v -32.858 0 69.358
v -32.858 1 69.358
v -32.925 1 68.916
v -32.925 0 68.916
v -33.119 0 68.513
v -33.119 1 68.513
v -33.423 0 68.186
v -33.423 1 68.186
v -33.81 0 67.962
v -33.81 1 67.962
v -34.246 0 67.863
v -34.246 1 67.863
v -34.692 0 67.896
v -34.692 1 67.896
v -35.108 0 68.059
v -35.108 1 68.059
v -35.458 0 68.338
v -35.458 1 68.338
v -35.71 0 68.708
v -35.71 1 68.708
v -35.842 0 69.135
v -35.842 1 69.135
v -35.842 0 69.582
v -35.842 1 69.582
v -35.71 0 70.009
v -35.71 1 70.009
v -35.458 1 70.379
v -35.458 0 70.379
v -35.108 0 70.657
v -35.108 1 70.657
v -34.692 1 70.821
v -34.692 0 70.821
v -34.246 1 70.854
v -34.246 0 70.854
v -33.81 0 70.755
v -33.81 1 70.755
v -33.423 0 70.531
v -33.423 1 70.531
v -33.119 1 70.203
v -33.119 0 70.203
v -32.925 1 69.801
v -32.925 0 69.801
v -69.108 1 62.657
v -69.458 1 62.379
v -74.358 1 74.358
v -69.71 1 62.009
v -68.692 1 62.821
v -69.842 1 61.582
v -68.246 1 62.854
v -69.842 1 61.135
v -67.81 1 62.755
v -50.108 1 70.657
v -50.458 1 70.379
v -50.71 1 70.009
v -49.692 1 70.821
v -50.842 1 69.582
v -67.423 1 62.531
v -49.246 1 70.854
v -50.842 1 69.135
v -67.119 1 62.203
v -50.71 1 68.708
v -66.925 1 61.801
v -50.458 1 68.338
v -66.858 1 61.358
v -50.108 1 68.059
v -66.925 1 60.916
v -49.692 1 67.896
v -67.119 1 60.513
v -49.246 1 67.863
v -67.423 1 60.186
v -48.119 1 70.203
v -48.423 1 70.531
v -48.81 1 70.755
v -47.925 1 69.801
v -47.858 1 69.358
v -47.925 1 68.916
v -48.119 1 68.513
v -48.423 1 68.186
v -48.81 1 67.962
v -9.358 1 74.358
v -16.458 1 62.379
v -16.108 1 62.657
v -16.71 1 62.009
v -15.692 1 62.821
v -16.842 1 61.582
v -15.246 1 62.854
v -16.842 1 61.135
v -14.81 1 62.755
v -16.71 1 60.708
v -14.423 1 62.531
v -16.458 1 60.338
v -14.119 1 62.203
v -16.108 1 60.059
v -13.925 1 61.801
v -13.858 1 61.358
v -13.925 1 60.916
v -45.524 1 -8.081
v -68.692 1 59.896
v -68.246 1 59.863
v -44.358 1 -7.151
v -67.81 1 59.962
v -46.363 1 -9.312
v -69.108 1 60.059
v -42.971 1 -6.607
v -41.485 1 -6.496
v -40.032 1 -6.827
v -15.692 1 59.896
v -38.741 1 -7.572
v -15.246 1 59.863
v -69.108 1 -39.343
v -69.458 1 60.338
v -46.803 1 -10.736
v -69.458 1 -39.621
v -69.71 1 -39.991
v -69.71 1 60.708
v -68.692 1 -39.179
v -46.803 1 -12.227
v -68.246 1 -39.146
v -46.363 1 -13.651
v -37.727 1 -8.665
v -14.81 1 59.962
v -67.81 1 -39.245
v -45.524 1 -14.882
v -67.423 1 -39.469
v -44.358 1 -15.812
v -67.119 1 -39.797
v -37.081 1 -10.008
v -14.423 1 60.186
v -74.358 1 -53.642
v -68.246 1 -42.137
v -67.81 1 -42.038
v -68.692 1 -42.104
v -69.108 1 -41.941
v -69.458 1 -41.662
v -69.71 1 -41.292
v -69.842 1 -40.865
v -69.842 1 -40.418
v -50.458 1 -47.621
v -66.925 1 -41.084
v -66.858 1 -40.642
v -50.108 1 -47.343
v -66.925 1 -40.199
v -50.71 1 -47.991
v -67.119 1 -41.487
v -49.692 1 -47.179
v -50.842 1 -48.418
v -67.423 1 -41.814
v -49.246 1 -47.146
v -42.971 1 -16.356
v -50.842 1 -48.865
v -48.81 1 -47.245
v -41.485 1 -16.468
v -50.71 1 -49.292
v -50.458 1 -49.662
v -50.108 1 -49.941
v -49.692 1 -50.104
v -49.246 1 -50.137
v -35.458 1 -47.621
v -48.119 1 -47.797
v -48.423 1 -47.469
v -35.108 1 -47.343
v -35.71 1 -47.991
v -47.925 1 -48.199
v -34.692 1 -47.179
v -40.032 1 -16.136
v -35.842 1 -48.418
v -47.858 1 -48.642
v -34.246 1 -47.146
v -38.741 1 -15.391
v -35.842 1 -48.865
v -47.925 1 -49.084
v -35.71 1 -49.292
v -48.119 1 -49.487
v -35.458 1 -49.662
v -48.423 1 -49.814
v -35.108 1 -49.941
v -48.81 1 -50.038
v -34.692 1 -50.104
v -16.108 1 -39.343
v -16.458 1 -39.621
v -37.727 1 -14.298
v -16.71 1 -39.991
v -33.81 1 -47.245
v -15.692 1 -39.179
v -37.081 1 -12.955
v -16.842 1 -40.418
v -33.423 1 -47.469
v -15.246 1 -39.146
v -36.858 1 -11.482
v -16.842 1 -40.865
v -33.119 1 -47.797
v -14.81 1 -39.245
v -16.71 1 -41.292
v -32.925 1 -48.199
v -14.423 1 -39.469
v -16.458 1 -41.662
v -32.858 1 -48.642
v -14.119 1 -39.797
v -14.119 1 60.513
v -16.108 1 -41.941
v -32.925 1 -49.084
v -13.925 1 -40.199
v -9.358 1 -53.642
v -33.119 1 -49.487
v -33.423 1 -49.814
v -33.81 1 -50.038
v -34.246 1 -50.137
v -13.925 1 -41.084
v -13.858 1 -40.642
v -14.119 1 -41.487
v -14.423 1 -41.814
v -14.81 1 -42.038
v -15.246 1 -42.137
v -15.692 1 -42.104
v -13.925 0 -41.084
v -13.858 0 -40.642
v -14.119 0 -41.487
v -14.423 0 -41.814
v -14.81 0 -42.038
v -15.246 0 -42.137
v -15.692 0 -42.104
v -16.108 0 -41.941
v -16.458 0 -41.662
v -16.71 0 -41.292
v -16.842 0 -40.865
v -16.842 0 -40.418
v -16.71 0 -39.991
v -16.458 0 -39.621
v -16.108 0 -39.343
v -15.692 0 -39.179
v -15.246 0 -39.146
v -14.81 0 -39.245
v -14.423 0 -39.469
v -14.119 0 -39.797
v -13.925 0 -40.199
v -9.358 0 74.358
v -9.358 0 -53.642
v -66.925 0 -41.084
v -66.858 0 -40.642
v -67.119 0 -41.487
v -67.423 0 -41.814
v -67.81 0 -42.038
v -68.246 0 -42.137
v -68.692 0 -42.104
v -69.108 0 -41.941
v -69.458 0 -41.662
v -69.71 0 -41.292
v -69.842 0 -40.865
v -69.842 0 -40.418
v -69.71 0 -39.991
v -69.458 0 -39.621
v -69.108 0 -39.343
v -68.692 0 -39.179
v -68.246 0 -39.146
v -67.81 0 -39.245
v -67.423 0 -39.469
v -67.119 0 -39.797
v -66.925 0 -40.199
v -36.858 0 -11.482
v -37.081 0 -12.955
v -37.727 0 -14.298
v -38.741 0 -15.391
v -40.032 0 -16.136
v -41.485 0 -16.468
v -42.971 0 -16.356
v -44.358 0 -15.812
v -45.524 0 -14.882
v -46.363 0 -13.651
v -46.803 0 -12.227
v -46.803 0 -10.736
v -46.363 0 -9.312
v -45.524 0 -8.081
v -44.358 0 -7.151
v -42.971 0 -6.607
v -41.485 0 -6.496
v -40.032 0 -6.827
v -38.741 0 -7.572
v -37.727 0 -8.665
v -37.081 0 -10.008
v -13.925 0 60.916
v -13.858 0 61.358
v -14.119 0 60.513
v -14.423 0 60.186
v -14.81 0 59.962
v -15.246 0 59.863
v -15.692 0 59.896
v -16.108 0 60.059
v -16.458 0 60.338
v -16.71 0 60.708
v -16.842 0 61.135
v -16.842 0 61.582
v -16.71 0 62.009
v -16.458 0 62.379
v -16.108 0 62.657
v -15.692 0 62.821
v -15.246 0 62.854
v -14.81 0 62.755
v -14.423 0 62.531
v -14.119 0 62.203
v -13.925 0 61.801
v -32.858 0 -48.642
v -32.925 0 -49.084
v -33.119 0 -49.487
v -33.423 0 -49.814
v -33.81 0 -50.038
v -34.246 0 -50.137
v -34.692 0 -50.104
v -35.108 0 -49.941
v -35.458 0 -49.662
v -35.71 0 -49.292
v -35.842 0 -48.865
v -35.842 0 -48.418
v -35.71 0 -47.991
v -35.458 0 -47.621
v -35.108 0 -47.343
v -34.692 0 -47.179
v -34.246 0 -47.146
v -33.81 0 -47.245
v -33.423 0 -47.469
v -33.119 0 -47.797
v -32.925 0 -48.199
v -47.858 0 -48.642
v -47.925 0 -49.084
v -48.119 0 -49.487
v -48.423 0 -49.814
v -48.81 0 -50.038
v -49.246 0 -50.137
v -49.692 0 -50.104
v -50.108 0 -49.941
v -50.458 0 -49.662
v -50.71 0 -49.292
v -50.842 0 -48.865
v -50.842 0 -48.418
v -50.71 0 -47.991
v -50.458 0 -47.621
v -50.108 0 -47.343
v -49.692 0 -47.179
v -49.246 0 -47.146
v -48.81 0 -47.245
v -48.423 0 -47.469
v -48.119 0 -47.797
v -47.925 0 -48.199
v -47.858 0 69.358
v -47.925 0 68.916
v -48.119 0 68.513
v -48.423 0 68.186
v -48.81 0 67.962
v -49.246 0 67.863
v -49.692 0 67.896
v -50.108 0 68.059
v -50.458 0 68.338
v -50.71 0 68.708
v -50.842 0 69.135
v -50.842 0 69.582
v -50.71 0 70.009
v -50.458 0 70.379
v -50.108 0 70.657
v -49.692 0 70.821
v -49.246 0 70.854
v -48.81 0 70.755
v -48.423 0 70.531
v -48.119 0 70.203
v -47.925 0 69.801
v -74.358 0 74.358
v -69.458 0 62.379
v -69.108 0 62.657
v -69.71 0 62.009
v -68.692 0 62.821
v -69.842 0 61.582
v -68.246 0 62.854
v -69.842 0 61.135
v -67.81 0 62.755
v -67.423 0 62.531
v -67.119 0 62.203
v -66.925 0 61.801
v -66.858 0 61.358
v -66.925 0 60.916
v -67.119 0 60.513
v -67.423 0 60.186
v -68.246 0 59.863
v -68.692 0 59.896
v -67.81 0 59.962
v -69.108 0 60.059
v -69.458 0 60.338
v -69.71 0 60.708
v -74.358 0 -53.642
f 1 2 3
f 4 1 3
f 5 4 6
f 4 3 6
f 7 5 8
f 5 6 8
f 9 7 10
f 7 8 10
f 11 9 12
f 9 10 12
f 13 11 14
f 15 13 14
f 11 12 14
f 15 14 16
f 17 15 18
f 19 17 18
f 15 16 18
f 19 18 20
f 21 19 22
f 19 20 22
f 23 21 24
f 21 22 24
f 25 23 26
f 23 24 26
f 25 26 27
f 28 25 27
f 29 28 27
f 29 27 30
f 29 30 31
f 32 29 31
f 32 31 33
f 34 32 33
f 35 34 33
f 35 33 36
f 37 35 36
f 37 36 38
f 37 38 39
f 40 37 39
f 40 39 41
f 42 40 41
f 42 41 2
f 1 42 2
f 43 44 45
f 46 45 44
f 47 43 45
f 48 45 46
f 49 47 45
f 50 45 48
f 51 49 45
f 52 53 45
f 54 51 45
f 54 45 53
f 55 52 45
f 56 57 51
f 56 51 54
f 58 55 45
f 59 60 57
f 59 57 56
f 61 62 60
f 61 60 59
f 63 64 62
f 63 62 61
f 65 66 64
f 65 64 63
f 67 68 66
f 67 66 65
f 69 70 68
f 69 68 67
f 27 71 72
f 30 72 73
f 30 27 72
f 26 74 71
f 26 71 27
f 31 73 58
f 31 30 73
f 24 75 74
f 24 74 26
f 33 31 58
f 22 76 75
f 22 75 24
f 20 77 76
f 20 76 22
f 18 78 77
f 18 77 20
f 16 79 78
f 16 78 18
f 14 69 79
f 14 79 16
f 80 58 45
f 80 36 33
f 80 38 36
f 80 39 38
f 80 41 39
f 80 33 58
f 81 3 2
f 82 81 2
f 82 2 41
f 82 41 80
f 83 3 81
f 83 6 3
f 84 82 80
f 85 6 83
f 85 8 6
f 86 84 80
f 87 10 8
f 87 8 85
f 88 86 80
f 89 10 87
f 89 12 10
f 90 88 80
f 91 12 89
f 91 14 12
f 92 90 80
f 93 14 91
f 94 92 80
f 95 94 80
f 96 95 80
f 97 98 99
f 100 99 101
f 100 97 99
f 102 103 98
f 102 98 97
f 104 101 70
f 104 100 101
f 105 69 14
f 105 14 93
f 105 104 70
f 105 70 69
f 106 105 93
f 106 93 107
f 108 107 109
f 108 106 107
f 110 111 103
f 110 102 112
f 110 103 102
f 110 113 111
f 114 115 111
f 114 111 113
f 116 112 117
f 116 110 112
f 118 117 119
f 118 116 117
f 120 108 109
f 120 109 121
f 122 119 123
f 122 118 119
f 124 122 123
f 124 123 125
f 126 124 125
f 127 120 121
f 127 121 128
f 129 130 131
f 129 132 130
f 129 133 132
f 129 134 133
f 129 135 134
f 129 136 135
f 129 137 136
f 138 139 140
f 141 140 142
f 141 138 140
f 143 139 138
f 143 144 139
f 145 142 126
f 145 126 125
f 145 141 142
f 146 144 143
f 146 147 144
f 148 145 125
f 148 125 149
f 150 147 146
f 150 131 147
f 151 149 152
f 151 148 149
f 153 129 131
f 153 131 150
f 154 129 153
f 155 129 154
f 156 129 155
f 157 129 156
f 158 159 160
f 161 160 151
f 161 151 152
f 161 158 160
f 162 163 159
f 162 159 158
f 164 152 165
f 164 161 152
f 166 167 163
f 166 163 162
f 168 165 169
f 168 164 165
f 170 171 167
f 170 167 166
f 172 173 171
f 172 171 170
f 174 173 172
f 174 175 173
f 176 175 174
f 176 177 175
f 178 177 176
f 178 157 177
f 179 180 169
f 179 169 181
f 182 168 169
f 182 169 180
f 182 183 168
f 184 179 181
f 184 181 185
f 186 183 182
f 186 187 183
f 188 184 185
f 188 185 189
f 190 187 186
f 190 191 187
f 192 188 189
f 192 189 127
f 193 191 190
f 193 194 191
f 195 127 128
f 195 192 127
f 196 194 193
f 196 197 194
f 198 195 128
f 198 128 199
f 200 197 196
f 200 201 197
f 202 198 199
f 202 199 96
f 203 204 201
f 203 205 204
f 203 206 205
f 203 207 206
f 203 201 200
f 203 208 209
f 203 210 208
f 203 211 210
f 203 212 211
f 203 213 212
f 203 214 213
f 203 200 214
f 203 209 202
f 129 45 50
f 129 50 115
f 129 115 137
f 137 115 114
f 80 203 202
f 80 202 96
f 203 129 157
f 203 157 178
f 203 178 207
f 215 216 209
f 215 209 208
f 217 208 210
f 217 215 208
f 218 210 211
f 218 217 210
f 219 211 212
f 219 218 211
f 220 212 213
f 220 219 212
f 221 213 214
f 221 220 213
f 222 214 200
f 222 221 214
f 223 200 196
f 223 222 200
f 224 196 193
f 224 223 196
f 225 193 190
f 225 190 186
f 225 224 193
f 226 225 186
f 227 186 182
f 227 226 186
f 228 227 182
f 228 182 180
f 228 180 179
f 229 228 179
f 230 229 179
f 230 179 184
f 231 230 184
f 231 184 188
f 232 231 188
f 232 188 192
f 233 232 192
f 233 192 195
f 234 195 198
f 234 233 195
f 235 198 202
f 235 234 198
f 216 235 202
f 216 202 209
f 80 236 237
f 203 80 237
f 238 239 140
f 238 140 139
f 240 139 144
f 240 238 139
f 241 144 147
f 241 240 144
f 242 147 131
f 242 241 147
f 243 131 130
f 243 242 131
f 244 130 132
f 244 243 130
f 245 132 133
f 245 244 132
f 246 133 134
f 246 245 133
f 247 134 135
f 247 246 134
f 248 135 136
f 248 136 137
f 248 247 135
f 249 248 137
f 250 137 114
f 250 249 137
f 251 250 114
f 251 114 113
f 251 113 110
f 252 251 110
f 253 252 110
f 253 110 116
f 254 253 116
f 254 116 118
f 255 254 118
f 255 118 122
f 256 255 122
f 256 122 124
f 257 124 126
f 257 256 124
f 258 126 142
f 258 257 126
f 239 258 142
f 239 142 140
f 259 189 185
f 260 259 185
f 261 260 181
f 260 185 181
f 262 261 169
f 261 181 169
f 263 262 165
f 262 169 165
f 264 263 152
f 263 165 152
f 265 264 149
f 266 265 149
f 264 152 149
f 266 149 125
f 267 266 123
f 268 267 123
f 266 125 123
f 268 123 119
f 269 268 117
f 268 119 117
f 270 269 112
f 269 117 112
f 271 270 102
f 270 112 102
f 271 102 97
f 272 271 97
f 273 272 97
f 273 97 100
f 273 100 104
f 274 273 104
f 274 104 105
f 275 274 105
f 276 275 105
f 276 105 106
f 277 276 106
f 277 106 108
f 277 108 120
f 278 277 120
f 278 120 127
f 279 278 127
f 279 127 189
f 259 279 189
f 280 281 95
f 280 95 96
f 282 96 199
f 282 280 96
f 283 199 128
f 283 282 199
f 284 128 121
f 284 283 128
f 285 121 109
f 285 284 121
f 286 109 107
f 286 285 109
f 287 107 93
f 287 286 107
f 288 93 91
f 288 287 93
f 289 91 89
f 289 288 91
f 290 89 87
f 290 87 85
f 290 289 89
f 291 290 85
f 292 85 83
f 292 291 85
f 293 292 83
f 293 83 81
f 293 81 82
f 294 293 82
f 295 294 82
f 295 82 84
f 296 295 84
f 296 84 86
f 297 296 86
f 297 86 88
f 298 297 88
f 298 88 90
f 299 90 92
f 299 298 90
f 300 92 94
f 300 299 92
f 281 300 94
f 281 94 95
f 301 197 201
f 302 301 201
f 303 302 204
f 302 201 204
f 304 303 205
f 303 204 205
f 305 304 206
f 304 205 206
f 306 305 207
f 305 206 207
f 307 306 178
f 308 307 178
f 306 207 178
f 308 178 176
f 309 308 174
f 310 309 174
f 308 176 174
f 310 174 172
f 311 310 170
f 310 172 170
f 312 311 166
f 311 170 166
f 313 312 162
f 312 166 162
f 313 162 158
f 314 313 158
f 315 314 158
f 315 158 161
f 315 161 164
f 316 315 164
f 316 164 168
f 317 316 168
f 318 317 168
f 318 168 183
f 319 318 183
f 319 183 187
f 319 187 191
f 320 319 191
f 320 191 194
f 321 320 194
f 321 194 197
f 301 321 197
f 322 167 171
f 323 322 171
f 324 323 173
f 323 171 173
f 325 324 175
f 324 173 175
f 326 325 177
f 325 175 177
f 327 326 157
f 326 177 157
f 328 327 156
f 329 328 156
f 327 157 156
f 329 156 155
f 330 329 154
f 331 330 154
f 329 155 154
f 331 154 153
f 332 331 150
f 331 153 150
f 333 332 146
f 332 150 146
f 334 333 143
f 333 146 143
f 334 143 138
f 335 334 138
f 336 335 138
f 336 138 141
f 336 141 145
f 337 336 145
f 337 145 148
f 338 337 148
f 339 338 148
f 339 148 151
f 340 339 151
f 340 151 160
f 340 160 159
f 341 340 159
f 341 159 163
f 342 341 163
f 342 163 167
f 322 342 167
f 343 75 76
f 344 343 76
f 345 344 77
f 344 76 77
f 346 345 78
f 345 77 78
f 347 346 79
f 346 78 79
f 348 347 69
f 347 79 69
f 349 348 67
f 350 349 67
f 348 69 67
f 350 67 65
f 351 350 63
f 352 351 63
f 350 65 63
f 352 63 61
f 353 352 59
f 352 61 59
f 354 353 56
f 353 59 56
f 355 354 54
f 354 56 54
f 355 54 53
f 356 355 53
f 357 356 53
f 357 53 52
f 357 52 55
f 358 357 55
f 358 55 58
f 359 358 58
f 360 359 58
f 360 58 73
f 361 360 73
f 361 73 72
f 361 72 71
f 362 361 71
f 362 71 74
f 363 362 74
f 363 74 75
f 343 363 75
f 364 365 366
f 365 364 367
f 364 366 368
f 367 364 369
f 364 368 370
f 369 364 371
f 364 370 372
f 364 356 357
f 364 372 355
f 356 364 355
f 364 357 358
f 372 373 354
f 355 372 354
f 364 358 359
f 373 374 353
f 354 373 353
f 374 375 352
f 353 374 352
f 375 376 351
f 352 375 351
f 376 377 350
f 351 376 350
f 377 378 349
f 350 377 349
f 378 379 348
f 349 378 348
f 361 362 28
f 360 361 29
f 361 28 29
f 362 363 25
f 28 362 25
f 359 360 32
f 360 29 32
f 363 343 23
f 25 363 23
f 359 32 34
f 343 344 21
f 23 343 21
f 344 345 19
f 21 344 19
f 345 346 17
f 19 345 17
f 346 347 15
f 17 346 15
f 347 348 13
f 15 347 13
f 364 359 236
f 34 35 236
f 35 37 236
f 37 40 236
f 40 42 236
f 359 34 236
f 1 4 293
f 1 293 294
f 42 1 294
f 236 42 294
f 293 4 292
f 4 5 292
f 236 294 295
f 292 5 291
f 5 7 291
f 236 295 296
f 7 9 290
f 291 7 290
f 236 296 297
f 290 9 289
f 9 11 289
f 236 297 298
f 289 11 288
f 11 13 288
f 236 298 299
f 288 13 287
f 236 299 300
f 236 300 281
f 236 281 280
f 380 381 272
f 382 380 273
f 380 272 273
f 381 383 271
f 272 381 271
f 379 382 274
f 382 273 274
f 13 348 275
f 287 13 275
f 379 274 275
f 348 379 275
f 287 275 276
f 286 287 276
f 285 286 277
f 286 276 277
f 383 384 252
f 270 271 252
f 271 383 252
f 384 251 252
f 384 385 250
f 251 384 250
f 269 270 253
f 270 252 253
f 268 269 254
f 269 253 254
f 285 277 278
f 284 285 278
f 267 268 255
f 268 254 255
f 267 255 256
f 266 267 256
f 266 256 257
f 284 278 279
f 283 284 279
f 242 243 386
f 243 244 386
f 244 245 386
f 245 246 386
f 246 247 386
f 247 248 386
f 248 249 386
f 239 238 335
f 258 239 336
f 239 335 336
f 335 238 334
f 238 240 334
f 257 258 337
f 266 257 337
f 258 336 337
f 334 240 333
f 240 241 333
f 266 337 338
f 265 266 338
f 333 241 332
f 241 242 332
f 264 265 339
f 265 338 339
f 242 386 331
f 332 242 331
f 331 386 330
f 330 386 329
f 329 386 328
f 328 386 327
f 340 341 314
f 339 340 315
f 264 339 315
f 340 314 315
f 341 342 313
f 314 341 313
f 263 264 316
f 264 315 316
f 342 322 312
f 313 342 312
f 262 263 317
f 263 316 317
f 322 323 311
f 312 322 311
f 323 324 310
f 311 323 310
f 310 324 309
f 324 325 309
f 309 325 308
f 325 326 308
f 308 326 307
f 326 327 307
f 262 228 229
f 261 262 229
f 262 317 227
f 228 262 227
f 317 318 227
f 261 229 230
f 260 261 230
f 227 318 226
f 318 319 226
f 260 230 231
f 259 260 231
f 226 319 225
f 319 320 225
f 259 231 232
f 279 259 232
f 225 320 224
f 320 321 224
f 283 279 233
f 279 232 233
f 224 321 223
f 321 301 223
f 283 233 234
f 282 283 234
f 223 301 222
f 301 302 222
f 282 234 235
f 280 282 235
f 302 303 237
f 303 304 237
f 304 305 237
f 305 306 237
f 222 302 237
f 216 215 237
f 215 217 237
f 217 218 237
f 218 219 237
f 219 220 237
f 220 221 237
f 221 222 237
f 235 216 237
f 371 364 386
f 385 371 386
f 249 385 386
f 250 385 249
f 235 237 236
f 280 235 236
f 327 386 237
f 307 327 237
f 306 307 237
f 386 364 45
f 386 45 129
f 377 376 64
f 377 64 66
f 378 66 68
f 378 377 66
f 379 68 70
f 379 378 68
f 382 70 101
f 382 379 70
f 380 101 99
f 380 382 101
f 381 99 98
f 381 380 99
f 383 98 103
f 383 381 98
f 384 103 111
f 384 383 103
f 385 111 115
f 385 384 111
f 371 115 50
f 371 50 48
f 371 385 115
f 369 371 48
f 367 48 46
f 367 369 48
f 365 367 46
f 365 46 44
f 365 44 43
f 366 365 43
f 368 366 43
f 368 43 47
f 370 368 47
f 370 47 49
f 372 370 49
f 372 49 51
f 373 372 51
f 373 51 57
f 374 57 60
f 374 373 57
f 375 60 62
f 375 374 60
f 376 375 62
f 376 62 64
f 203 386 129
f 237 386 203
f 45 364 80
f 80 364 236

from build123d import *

# Parameters (mm, degrees)
SKETCH_1_W          = 65
SKETCH_1_H          = 128
SKETCH_1_R          = 1.5
EXTRUDE_1_DEPTH     = 1
SKETCH_2_R          = 1.5
CUT_EXTRUDE_1_DEPTH = 2
SKETCH_3_R          = 5
CUT_EXTRUDE_2_DEPTH = 10


with BuildPart() as part:
    # Эскиз1 → Бобышка-Вытянуть1 (new body)
    with BuildSketch(Plane(origin=(0, 0, 0), x_dir=(1, 0, 0), z_dir=(0, 1, 0))):
        with Locations((-41.85845893, -10.35845893)):
            Rectangle(SKETCH_1_W, SKETCH_1_H)
        with Locations((-68.35845893, 40.64154107)):
            Circle(SKETCH_1_R, mode=Mode.SUBTRACT)
        with Locations((-15.35845893, 40.64154107)):
            Circle(SKETCH_1_R, mode=Mode.SUBTRACT)
        with Locations((-15.35845893, -61.35845893)):
            Circle(SKETCH_1_R, mode=Mode.SUBTRACT)
        with Locations((-68.35845893, -61.35845893)):
            Circle(SKETCH_1_R, mode=Mode.SUBTRACT)
    extrude(amount=EXTRUDE_1_DEPTH)

    # Эскиз2 → Вырез-Вытянуть1 (cut, through all)
    with BuildSketch(Plane(origin=(0, 1, 0), x_dir=(1, 0, 0), z_dir=(0, 1, 0))):
        with Locations((-49.35845893, 48.64154107)):
            Circle(SKETCH_2_R)
        with Locations((-34.35845893, 48.64154107)):
            Circle(SKETCH_2_R)
        with Locations((-34.35845893, -69.35845893)):
            Circle(SKETCH_2_R)
        with Locations((-49.35845893, -69.35845893)):
            Circle(SKETCH_2_R)
    extrude(amount=-CUT_EXTRUDE_1_DEPTH, mode=Mode.SUBTRACT)

    # Эскиз3 → Вырез-Вытянуть2 (cut)
    with BuildSketch(Plane(origin=(0, 1, 0), x_dir=(1, 0, 0), z_dir=(0, 1, 0))):
        with Locations((-41.85845893, 11.48154107)):
            Circle(SKETCH_3_R)
    extrude(amount=-CUT_EXTRUDE_2_DEPTH, mode=Mode.SUBTRACT)


solid = part.part
